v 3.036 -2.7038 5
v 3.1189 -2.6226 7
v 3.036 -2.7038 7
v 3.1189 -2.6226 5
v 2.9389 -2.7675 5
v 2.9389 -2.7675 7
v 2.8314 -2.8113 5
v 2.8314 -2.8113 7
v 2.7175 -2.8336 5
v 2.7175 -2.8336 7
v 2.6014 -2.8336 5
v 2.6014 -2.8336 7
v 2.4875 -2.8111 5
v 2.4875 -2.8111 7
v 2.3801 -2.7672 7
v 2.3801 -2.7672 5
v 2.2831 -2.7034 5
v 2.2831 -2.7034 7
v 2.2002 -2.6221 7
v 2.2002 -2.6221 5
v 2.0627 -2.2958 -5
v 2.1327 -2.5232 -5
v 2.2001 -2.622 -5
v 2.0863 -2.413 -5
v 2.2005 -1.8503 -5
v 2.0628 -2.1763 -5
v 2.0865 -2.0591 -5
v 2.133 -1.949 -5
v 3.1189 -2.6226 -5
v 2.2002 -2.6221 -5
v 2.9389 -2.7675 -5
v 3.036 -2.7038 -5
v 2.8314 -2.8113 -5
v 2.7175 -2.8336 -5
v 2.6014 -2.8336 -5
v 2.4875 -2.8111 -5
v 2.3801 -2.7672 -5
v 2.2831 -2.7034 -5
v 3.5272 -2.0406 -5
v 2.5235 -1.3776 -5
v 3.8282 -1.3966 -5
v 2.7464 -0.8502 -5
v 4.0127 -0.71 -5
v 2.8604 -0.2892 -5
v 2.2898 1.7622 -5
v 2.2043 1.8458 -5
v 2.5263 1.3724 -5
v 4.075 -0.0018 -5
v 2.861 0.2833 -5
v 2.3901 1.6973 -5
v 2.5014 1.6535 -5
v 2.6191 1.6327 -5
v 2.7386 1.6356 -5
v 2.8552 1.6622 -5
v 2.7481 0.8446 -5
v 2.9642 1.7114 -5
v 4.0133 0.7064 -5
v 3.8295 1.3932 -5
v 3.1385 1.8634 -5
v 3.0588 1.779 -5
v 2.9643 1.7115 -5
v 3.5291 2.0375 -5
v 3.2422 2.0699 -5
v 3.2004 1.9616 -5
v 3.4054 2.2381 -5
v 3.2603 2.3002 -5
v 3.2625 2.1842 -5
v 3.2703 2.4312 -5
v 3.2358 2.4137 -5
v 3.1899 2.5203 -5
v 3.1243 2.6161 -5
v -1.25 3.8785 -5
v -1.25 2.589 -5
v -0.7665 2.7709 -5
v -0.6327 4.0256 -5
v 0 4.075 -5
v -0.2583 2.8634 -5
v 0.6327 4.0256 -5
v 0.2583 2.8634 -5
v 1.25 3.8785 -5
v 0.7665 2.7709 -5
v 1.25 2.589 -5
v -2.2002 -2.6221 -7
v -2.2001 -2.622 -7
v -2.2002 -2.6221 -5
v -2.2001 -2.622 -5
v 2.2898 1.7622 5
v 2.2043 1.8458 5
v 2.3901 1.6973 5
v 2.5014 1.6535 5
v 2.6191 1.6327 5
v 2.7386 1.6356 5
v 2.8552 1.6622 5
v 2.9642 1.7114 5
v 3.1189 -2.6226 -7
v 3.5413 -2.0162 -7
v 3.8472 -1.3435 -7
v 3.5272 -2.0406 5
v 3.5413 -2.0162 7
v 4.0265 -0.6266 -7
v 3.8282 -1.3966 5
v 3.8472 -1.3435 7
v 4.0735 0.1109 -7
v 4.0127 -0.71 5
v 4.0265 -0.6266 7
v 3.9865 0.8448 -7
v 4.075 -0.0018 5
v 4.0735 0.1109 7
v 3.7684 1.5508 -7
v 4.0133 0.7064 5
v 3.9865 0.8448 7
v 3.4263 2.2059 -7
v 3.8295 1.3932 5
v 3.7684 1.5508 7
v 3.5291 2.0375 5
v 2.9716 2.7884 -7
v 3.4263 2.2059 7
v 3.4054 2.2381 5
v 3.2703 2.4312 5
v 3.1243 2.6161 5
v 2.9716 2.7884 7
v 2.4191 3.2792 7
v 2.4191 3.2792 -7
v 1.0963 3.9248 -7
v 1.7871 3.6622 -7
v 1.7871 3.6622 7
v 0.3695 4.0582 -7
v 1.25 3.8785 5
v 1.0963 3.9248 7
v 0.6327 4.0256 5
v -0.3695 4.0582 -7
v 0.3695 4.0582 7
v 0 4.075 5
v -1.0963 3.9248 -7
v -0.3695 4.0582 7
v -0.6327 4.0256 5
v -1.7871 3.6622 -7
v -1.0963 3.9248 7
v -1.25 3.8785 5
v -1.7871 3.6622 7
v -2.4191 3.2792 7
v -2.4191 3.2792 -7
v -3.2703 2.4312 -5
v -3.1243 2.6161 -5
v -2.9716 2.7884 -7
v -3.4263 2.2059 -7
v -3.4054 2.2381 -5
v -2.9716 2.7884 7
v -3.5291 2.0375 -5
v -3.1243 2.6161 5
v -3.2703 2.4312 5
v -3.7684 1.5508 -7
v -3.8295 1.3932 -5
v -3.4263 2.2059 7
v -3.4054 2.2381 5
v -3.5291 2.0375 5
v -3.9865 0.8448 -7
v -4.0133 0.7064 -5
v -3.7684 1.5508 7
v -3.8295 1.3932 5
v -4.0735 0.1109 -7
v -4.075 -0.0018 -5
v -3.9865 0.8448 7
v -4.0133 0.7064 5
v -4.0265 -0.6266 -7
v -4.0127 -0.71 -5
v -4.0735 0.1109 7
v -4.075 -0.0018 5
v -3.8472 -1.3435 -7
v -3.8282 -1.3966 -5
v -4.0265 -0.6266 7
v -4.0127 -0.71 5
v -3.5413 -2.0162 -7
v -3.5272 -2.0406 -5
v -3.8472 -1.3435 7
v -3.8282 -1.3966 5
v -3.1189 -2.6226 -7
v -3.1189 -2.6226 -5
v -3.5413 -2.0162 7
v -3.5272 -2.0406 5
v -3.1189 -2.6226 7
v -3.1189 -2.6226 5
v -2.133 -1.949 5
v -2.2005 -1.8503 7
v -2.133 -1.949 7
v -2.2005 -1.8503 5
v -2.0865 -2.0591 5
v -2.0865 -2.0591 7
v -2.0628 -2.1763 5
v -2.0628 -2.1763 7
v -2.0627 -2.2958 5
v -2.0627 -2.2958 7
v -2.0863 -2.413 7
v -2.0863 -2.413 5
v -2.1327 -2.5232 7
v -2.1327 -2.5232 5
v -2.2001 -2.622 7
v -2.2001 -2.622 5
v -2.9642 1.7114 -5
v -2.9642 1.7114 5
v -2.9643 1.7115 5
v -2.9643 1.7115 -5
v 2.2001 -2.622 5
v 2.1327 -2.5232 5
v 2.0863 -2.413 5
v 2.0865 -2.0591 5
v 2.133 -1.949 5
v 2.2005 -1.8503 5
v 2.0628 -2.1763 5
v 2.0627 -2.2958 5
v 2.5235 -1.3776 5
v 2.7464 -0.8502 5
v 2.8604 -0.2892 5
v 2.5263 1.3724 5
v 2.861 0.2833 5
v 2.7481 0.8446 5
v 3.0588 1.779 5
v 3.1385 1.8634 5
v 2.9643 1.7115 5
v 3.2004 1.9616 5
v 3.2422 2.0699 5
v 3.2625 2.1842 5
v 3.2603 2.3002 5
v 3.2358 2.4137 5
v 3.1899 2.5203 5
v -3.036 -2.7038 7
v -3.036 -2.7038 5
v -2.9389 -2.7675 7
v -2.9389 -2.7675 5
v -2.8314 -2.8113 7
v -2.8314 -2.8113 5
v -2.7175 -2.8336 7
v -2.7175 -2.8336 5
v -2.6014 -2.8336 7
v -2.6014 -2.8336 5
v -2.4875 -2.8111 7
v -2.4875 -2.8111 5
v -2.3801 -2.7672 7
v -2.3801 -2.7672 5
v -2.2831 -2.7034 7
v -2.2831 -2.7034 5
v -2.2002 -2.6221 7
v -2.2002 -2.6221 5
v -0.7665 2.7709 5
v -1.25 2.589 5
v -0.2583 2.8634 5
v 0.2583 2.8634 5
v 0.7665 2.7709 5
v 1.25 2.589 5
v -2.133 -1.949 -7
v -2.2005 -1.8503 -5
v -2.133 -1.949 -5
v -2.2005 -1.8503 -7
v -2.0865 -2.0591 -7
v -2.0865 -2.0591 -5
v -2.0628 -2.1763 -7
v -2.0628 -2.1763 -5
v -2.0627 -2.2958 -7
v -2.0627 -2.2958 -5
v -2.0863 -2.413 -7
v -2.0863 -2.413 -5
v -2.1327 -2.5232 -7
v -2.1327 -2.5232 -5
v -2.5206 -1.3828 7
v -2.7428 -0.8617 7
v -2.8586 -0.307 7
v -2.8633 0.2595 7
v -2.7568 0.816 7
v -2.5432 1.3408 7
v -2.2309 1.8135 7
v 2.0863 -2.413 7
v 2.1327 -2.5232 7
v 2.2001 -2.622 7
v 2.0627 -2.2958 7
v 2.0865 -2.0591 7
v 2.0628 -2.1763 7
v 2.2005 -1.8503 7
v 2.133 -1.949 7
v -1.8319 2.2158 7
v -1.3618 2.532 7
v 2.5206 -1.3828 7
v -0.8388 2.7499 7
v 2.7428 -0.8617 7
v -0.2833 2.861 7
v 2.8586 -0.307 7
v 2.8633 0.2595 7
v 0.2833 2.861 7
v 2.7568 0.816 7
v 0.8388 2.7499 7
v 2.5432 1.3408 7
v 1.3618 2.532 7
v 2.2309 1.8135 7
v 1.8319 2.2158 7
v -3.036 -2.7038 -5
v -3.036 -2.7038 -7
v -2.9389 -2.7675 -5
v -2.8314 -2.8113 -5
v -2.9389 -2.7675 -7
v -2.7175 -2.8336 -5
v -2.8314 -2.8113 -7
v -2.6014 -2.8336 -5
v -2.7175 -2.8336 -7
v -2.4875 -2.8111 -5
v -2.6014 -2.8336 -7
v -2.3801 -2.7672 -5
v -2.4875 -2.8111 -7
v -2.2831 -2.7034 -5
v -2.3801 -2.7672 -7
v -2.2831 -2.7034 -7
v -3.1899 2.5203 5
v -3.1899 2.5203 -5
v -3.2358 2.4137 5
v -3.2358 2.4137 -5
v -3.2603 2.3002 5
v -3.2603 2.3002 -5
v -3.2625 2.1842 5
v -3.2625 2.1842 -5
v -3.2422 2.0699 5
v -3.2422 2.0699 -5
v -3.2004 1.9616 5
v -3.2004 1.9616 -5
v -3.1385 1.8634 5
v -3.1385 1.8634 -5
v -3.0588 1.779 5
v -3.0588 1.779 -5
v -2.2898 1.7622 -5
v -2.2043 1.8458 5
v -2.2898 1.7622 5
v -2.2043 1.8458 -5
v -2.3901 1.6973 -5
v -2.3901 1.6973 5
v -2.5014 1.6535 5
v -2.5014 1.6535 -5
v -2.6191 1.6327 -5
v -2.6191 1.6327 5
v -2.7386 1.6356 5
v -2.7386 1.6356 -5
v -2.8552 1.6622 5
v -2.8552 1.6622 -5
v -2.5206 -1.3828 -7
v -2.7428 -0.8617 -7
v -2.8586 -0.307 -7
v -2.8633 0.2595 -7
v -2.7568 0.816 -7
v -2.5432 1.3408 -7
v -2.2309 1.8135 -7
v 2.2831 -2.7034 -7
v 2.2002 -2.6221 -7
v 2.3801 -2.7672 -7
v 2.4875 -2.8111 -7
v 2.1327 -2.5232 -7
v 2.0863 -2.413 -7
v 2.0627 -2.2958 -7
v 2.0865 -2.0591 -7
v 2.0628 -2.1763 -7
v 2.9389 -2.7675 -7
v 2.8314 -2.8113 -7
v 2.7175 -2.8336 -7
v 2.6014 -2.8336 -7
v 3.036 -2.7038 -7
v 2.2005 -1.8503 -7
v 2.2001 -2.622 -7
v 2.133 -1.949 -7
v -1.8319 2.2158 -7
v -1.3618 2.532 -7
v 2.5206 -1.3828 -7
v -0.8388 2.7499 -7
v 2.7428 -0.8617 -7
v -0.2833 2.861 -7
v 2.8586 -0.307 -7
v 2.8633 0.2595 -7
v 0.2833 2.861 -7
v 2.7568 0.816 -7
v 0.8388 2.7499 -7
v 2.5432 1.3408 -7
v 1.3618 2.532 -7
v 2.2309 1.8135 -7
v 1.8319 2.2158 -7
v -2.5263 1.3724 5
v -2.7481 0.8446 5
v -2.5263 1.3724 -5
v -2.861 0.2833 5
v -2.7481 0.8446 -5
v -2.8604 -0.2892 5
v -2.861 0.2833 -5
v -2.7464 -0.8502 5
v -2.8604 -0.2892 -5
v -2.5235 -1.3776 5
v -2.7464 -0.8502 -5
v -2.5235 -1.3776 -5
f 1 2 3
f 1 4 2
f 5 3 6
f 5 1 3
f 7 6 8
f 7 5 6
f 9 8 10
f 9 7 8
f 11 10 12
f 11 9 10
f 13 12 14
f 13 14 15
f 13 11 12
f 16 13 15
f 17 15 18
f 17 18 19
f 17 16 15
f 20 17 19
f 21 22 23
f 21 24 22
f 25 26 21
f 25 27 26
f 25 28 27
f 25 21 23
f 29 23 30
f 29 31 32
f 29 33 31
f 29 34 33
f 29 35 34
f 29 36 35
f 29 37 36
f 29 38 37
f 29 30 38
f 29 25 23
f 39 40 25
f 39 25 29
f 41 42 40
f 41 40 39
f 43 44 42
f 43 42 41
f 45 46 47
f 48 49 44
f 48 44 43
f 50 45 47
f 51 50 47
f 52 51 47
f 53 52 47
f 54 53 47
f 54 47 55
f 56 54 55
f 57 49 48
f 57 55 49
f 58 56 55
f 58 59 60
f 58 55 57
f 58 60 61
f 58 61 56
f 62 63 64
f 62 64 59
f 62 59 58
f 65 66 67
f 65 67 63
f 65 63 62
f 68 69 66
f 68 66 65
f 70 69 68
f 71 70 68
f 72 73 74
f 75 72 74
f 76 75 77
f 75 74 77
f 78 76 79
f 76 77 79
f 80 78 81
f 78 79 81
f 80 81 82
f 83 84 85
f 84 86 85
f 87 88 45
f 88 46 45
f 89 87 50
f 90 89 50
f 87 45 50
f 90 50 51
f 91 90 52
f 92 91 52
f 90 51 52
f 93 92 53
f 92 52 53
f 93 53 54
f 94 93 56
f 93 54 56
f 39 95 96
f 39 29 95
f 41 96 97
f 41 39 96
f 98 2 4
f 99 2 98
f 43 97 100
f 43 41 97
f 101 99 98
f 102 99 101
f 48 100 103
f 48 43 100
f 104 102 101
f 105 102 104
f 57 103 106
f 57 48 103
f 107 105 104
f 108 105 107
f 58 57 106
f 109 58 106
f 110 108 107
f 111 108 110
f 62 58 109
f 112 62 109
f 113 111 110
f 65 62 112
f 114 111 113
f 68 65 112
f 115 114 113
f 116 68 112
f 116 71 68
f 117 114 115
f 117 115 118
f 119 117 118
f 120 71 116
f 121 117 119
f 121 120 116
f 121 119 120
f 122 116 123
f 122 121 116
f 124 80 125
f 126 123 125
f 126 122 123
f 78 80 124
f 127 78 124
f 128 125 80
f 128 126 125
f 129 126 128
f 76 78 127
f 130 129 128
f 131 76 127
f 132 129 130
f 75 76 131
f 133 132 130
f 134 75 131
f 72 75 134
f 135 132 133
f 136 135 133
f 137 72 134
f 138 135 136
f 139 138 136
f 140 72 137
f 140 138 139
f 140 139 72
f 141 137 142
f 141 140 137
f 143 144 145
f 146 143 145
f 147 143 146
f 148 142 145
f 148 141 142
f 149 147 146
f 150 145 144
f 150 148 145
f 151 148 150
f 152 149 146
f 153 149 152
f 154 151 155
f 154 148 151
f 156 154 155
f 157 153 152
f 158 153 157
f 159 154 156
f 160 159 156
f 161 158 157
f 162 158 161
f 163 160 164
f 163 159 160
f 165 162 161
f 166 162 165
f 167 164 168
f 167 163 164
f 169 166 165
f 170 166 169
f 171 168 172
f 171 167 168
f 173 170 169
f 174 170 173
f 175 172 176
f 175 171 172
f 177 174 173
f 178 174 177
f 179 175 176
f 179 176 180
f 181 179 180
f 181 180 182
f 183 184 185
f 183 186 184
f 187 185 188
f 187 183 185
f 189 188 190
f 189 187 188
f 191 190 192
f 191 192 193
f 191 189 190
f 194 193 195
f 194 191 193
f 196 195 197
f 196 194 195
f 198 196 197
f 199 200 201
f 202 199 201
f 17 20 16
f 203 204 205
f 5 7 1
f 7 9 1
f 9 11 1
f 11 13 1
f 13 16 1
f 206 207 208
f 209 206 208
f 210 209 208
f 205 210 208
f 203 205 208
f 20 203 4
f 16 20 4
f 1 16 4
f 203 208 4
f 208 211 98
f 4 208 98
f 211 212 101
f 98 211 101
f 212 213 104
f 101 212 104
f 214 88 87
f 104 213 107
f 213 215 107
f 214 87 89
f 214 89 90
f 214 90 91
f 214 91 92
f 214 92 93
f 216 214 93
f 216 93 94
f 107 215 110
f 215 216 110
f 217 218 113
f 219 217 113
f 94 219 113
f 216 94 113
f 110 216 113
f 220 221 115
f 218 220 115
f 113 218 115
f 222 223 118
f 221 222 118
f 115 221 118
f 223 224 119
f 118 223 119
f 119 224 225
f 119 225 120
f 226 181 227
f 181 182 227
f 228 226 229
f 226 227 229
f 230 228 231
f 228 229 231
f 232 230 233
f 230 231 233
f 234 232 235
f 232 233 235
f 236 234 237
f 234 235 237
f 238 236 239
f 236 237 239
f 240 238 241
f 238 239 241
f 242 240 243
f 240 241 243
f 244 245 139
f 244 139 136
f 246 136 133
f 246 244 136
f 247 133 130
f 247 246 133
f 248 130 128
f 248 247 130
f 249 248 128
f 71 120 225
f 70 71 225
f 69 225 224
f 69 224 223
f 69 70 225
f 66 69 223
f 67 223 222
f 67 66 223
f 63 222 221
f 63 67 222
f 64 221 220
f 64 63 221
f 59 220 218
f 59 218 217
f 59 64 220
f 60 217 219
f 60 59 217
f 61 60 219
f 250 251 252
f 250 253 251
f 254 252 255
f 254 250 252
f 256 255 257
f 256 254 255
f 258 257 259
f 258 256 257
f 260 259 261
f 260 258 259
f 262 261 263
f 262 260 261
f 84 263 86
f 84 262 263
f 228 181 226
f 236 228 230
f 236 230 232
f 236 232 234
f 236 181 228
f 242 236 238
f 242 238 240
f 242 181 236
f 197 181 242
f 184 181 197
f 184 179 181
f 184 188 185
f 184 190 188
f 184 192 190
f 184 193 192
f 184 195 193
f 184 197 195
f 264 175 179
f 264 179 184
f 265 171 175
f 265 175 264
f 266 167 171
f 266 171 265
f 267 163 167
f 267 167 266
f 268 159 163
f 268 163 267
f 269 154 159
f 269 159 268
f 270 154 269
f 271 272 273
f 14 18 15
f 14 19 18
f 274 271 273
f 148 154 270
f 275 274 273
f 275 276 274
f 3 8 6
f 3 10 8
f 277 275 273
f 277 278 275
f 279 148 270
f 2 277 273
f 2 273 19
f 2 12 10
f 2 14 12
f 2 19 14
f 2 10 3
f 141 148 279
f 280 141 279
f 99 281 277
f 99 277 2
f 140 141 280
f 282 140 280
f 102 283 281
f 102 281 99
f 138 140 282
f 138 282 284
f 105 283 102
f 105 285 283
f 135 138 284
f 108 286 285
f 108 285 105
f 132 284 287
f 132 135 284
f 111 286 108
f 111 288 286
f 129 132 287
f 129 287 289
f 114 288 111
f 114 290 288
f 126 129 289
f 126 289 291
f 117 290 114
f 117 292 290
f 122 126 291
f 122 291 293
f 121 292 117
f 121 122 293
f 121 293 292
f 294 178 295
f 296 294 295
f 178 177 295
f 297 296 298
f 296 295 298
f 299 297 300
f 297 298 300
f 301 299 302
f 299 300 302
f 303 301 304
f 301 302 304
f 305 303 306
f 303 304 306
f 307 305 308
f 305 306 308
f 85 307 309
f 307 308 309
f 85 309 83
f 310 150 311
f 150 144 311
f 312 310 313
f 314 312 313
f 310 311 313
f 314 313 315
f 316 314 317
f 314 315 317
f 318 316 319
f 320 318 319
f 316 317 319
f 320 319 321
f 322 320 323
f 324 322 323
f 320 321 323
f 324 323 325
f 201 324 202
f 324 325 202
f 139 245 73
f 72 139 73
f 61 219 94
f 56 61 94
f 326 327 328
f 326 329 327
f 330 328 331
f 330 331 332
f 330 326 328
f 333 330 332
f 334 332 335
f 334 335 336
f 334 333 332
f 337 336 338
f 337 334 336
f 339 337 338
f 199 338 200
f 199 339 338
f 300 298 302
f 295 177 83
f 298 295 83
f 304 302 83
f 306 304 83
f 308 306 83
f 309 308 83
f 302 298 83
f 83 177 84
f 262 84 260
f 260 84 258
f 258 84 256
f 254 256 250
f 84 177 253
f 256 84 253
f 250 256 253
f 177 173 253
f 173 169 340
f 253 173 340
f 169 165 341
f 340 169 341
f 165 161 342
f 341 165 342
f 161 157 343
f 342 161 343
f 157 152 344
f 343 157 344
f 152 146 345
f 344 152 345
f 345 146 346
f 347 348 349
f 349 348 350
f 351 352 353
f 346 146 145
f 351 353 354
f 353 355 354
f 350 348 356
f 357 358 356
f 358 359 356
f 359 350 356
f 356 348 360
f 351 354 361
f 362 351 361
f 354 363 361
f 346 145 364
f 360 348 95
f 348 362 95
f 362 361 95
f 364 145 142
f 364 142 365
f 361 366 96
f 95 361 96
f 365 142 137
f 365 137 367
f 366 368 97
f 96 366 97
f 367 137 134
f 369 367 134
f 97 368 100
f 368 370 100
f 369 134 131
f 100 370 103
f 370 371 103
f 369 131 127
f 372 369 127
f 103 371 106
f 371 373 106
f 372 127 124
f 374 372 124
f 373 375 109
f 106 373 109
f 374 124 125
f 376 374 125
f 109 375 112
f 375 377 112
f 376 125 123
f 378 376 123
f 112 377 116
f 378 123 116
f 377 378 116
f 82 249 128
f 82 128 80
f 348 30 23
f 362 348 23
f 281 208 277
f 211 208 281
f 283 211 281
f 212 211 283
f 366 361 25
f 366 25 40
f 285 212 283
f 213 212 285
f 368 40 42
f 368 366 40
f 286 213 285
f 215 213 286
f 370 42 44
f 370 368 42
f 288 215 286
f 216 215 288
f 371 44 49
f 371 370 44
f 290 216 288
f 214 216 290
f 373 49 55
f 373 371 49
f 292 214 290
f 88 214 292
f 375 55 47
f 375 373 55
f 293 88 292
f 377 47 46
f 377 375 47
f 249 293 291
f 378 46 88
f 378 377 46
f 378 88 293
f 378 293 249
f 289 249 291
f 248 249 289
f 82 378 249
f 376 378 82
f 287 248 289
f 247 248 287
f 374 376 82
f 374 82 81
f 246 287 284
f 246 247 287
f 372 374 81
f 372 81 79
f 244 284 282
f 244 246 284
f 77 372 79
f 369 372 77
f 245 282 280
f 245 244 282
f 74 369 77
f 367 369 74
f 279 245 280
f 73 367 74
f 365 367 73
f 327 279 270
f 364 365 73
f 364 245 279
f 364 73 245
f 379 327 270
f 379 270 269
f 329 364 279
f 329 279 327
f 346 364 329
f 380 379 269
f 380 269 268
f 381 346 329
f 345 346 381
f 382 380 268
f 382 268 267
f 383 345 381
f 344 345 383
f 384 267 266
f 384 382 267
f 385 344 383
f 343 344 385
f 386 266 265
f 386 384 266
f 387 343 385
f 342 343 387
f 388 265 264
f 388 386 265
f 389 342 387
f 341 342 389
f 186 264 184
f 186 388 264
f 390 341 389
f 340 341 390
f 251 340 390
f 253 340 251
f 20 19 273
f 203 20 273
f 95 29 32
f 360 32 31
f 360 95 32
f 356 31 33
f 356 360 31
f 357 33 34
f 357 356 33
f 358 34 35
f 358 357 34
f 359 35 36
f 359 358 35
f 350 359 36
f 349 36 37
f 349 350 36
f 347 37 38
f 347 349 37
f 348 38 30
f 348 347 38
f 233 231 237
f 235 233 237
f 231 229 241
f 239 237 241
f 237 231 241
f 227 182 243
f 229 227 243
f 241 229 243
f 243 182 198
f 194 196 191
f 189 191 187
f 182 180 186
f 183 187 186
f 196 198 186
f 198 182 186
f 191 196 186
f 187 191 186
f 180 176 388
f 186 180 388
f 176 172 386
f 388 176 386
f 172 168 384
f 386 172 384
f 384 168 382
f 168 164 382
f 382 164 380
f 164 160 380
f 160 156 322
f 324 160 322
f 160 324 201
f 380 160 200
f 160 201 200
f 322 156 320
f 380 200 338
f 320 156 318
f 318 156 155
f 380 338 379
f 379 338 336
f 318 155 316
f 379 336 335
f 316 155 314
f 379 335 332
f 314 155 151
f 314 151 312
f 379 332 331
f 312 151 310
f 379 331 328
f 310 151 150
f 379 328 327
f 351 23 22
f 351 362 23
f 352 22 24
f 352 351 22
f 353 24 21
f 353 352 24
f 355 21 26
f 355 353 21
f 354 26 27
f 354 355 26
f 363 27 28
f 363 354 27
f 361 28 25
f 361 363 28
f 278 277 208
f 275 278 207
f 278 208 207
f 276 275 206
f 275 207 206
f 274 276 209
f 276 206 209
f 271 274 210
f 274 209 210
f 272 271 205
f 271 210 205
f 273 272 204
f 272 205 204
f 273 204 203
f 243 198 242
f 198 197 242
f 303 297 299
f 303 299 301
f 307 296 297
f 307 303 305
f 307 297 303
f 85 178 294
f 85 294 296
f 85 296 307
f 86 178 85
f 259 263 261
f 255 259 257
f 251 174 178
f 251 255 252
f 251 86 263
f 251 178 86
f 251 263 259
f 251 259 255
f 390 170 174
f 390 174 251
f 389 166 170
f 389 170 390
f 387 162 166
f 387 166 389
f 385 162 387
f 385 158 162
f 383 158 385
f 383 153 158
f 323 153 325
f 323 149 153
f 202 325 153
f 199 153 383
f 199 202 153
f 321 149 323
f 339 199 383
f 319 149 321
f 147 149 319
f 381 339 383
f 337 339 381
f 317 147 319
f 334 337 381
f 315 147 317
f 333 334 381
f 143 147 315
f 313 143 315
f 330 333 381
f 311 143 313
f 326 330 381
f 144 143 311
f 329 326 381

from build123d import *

# Parameters (mm, degrees)
SKETCH1_R               = 4.075
SKETCH1_R_2             = 2.875
BOSS_EXTRUDE1_DEPTH     = 7
CUT_EXTRUDE2_DEPTH      = 5
CUT_EXTRUDE2_DEPTH_BACK = 5
CUT_EXTRUDE3_DEPTH      = 10.067041965
CUT_EXTRUDE3_DEPTH_BACK = 10.067041965
FILLET2_R               = 0.6
CUT_EXTRUDE4_DEPTH      = 10.067041965
CUT_EXTRUDE4_DEPTH_BACK = 10.067041965
SKETCH6_W               = 2.5
SKETCH6_H               = 10


with BuildPart() as part:
    # Sketch1 → Boss-Extrude1 (new, symmetric)
    with BuildSketch(Plane.XY):
        Circle(SKETCH1_R)
        Circle(SKETCH1_R_2, mode=Mode.SUBTRACT)
    extrude(amount=BOSS_EXTRUDE1_DEPTH, both=True)

    # Sketch4 → Cut-Extrude2 (cut, two sides: drawn at the far end of the back side and taken through both)
    with BuildSketch(Plane(origin=(0, 0, 0), x_dir=(-1, 0, 0), z_dir=(0, 0, -1)).offset(-CUT_EXTRUDE2_DEPTH_BACK)):
        with BuildLine():
            Line((-3.52905352, 2.0375), (0, 0))
            Line((0, 0), (3.52905352, 2.0375))
            ThreePointArc((3.52905352, 2.0375), (0, -4.075), (-3.52905352, 2.0375))
        make_face()
    extrude(amount=CUT_EXTRUDE2_DEPTH + CUT_EXTRUDE2_DEPTH_BACK, mode=Mode.SUBTRACT)

    # Sketch5 → Cut-Extrude3 (cut, two sides: drawn at the far end of the back side and taken through both)
    with BuildSketch(Plane(origin=(0, 0, 0), x_dir=(-1, 0, 0), z_dir=(0, 0, -1)).offset(-CUT_EXTRUDE3_DEPTH_BACK)):
        with BuildLine():
            Line((-2.619359509, -3.121631106), (0, 0))
            Line((0, 0), (2.619359509, -3.121631106))
            ThreePointArc((2.619359509, -3.121631106), (0, -4.075), (-2.619359509, -3.121631106))
        make_face()
    extrude(amount=CUT_EXTRUDE3_DEPTH + CUT_EXTRUDE3_DEPTH_BACK, mode=Mode.SUBTRACT)

    # Fillet2
    fillet2_edges = [part.edges().sort_by_distance(p)[0] for p in [
        (-3.52905352, 2.0375, 0),
        (-2.489823036, 1.4375, 0),
        (3.52905352, 2.0375, 0),
        (2.489823036, 1.4375, 0),
        (-2.619359509, -3.121631106, 6),
        (-1.848014378, -2.202377774, 6),
        (2.619359509, -3.121631106, 6),
        (1.848014378, -2.202377774, 6),
        (-2.619359509, -3.121631106, -6),
        (-1.848014378, -2.202377774, -6),
        (1.848014378, -2.202377774, -6),
        (2.619359509, -3.121631106, -6),
    ]]
    fillet(fillet2_edges, radius=FILLET2_R - 0.0001)  # a hair under: the kernel refuses the full size

    # Sketch6 → Cut-Extrude4 (cut, two sides: drawn at the far end of the back side and taken through both)
    with BuildSketch(Plane(origin=(0, 0, 0), x_dir=(1, 0, 0), z_dir=(0, 1, 0)).offset(-CUT_EXTRUDE4_DEPTH_BACK)):
        Rectangle(SKETCH6_W, SKETCH6_H)
    extrude(amount=CUT_EXTRUDE4_DEPTH + CUT_EXTRUDE4_DEPTH_BACK, mode=Mode.SUBTRACT)


solid = part.part
